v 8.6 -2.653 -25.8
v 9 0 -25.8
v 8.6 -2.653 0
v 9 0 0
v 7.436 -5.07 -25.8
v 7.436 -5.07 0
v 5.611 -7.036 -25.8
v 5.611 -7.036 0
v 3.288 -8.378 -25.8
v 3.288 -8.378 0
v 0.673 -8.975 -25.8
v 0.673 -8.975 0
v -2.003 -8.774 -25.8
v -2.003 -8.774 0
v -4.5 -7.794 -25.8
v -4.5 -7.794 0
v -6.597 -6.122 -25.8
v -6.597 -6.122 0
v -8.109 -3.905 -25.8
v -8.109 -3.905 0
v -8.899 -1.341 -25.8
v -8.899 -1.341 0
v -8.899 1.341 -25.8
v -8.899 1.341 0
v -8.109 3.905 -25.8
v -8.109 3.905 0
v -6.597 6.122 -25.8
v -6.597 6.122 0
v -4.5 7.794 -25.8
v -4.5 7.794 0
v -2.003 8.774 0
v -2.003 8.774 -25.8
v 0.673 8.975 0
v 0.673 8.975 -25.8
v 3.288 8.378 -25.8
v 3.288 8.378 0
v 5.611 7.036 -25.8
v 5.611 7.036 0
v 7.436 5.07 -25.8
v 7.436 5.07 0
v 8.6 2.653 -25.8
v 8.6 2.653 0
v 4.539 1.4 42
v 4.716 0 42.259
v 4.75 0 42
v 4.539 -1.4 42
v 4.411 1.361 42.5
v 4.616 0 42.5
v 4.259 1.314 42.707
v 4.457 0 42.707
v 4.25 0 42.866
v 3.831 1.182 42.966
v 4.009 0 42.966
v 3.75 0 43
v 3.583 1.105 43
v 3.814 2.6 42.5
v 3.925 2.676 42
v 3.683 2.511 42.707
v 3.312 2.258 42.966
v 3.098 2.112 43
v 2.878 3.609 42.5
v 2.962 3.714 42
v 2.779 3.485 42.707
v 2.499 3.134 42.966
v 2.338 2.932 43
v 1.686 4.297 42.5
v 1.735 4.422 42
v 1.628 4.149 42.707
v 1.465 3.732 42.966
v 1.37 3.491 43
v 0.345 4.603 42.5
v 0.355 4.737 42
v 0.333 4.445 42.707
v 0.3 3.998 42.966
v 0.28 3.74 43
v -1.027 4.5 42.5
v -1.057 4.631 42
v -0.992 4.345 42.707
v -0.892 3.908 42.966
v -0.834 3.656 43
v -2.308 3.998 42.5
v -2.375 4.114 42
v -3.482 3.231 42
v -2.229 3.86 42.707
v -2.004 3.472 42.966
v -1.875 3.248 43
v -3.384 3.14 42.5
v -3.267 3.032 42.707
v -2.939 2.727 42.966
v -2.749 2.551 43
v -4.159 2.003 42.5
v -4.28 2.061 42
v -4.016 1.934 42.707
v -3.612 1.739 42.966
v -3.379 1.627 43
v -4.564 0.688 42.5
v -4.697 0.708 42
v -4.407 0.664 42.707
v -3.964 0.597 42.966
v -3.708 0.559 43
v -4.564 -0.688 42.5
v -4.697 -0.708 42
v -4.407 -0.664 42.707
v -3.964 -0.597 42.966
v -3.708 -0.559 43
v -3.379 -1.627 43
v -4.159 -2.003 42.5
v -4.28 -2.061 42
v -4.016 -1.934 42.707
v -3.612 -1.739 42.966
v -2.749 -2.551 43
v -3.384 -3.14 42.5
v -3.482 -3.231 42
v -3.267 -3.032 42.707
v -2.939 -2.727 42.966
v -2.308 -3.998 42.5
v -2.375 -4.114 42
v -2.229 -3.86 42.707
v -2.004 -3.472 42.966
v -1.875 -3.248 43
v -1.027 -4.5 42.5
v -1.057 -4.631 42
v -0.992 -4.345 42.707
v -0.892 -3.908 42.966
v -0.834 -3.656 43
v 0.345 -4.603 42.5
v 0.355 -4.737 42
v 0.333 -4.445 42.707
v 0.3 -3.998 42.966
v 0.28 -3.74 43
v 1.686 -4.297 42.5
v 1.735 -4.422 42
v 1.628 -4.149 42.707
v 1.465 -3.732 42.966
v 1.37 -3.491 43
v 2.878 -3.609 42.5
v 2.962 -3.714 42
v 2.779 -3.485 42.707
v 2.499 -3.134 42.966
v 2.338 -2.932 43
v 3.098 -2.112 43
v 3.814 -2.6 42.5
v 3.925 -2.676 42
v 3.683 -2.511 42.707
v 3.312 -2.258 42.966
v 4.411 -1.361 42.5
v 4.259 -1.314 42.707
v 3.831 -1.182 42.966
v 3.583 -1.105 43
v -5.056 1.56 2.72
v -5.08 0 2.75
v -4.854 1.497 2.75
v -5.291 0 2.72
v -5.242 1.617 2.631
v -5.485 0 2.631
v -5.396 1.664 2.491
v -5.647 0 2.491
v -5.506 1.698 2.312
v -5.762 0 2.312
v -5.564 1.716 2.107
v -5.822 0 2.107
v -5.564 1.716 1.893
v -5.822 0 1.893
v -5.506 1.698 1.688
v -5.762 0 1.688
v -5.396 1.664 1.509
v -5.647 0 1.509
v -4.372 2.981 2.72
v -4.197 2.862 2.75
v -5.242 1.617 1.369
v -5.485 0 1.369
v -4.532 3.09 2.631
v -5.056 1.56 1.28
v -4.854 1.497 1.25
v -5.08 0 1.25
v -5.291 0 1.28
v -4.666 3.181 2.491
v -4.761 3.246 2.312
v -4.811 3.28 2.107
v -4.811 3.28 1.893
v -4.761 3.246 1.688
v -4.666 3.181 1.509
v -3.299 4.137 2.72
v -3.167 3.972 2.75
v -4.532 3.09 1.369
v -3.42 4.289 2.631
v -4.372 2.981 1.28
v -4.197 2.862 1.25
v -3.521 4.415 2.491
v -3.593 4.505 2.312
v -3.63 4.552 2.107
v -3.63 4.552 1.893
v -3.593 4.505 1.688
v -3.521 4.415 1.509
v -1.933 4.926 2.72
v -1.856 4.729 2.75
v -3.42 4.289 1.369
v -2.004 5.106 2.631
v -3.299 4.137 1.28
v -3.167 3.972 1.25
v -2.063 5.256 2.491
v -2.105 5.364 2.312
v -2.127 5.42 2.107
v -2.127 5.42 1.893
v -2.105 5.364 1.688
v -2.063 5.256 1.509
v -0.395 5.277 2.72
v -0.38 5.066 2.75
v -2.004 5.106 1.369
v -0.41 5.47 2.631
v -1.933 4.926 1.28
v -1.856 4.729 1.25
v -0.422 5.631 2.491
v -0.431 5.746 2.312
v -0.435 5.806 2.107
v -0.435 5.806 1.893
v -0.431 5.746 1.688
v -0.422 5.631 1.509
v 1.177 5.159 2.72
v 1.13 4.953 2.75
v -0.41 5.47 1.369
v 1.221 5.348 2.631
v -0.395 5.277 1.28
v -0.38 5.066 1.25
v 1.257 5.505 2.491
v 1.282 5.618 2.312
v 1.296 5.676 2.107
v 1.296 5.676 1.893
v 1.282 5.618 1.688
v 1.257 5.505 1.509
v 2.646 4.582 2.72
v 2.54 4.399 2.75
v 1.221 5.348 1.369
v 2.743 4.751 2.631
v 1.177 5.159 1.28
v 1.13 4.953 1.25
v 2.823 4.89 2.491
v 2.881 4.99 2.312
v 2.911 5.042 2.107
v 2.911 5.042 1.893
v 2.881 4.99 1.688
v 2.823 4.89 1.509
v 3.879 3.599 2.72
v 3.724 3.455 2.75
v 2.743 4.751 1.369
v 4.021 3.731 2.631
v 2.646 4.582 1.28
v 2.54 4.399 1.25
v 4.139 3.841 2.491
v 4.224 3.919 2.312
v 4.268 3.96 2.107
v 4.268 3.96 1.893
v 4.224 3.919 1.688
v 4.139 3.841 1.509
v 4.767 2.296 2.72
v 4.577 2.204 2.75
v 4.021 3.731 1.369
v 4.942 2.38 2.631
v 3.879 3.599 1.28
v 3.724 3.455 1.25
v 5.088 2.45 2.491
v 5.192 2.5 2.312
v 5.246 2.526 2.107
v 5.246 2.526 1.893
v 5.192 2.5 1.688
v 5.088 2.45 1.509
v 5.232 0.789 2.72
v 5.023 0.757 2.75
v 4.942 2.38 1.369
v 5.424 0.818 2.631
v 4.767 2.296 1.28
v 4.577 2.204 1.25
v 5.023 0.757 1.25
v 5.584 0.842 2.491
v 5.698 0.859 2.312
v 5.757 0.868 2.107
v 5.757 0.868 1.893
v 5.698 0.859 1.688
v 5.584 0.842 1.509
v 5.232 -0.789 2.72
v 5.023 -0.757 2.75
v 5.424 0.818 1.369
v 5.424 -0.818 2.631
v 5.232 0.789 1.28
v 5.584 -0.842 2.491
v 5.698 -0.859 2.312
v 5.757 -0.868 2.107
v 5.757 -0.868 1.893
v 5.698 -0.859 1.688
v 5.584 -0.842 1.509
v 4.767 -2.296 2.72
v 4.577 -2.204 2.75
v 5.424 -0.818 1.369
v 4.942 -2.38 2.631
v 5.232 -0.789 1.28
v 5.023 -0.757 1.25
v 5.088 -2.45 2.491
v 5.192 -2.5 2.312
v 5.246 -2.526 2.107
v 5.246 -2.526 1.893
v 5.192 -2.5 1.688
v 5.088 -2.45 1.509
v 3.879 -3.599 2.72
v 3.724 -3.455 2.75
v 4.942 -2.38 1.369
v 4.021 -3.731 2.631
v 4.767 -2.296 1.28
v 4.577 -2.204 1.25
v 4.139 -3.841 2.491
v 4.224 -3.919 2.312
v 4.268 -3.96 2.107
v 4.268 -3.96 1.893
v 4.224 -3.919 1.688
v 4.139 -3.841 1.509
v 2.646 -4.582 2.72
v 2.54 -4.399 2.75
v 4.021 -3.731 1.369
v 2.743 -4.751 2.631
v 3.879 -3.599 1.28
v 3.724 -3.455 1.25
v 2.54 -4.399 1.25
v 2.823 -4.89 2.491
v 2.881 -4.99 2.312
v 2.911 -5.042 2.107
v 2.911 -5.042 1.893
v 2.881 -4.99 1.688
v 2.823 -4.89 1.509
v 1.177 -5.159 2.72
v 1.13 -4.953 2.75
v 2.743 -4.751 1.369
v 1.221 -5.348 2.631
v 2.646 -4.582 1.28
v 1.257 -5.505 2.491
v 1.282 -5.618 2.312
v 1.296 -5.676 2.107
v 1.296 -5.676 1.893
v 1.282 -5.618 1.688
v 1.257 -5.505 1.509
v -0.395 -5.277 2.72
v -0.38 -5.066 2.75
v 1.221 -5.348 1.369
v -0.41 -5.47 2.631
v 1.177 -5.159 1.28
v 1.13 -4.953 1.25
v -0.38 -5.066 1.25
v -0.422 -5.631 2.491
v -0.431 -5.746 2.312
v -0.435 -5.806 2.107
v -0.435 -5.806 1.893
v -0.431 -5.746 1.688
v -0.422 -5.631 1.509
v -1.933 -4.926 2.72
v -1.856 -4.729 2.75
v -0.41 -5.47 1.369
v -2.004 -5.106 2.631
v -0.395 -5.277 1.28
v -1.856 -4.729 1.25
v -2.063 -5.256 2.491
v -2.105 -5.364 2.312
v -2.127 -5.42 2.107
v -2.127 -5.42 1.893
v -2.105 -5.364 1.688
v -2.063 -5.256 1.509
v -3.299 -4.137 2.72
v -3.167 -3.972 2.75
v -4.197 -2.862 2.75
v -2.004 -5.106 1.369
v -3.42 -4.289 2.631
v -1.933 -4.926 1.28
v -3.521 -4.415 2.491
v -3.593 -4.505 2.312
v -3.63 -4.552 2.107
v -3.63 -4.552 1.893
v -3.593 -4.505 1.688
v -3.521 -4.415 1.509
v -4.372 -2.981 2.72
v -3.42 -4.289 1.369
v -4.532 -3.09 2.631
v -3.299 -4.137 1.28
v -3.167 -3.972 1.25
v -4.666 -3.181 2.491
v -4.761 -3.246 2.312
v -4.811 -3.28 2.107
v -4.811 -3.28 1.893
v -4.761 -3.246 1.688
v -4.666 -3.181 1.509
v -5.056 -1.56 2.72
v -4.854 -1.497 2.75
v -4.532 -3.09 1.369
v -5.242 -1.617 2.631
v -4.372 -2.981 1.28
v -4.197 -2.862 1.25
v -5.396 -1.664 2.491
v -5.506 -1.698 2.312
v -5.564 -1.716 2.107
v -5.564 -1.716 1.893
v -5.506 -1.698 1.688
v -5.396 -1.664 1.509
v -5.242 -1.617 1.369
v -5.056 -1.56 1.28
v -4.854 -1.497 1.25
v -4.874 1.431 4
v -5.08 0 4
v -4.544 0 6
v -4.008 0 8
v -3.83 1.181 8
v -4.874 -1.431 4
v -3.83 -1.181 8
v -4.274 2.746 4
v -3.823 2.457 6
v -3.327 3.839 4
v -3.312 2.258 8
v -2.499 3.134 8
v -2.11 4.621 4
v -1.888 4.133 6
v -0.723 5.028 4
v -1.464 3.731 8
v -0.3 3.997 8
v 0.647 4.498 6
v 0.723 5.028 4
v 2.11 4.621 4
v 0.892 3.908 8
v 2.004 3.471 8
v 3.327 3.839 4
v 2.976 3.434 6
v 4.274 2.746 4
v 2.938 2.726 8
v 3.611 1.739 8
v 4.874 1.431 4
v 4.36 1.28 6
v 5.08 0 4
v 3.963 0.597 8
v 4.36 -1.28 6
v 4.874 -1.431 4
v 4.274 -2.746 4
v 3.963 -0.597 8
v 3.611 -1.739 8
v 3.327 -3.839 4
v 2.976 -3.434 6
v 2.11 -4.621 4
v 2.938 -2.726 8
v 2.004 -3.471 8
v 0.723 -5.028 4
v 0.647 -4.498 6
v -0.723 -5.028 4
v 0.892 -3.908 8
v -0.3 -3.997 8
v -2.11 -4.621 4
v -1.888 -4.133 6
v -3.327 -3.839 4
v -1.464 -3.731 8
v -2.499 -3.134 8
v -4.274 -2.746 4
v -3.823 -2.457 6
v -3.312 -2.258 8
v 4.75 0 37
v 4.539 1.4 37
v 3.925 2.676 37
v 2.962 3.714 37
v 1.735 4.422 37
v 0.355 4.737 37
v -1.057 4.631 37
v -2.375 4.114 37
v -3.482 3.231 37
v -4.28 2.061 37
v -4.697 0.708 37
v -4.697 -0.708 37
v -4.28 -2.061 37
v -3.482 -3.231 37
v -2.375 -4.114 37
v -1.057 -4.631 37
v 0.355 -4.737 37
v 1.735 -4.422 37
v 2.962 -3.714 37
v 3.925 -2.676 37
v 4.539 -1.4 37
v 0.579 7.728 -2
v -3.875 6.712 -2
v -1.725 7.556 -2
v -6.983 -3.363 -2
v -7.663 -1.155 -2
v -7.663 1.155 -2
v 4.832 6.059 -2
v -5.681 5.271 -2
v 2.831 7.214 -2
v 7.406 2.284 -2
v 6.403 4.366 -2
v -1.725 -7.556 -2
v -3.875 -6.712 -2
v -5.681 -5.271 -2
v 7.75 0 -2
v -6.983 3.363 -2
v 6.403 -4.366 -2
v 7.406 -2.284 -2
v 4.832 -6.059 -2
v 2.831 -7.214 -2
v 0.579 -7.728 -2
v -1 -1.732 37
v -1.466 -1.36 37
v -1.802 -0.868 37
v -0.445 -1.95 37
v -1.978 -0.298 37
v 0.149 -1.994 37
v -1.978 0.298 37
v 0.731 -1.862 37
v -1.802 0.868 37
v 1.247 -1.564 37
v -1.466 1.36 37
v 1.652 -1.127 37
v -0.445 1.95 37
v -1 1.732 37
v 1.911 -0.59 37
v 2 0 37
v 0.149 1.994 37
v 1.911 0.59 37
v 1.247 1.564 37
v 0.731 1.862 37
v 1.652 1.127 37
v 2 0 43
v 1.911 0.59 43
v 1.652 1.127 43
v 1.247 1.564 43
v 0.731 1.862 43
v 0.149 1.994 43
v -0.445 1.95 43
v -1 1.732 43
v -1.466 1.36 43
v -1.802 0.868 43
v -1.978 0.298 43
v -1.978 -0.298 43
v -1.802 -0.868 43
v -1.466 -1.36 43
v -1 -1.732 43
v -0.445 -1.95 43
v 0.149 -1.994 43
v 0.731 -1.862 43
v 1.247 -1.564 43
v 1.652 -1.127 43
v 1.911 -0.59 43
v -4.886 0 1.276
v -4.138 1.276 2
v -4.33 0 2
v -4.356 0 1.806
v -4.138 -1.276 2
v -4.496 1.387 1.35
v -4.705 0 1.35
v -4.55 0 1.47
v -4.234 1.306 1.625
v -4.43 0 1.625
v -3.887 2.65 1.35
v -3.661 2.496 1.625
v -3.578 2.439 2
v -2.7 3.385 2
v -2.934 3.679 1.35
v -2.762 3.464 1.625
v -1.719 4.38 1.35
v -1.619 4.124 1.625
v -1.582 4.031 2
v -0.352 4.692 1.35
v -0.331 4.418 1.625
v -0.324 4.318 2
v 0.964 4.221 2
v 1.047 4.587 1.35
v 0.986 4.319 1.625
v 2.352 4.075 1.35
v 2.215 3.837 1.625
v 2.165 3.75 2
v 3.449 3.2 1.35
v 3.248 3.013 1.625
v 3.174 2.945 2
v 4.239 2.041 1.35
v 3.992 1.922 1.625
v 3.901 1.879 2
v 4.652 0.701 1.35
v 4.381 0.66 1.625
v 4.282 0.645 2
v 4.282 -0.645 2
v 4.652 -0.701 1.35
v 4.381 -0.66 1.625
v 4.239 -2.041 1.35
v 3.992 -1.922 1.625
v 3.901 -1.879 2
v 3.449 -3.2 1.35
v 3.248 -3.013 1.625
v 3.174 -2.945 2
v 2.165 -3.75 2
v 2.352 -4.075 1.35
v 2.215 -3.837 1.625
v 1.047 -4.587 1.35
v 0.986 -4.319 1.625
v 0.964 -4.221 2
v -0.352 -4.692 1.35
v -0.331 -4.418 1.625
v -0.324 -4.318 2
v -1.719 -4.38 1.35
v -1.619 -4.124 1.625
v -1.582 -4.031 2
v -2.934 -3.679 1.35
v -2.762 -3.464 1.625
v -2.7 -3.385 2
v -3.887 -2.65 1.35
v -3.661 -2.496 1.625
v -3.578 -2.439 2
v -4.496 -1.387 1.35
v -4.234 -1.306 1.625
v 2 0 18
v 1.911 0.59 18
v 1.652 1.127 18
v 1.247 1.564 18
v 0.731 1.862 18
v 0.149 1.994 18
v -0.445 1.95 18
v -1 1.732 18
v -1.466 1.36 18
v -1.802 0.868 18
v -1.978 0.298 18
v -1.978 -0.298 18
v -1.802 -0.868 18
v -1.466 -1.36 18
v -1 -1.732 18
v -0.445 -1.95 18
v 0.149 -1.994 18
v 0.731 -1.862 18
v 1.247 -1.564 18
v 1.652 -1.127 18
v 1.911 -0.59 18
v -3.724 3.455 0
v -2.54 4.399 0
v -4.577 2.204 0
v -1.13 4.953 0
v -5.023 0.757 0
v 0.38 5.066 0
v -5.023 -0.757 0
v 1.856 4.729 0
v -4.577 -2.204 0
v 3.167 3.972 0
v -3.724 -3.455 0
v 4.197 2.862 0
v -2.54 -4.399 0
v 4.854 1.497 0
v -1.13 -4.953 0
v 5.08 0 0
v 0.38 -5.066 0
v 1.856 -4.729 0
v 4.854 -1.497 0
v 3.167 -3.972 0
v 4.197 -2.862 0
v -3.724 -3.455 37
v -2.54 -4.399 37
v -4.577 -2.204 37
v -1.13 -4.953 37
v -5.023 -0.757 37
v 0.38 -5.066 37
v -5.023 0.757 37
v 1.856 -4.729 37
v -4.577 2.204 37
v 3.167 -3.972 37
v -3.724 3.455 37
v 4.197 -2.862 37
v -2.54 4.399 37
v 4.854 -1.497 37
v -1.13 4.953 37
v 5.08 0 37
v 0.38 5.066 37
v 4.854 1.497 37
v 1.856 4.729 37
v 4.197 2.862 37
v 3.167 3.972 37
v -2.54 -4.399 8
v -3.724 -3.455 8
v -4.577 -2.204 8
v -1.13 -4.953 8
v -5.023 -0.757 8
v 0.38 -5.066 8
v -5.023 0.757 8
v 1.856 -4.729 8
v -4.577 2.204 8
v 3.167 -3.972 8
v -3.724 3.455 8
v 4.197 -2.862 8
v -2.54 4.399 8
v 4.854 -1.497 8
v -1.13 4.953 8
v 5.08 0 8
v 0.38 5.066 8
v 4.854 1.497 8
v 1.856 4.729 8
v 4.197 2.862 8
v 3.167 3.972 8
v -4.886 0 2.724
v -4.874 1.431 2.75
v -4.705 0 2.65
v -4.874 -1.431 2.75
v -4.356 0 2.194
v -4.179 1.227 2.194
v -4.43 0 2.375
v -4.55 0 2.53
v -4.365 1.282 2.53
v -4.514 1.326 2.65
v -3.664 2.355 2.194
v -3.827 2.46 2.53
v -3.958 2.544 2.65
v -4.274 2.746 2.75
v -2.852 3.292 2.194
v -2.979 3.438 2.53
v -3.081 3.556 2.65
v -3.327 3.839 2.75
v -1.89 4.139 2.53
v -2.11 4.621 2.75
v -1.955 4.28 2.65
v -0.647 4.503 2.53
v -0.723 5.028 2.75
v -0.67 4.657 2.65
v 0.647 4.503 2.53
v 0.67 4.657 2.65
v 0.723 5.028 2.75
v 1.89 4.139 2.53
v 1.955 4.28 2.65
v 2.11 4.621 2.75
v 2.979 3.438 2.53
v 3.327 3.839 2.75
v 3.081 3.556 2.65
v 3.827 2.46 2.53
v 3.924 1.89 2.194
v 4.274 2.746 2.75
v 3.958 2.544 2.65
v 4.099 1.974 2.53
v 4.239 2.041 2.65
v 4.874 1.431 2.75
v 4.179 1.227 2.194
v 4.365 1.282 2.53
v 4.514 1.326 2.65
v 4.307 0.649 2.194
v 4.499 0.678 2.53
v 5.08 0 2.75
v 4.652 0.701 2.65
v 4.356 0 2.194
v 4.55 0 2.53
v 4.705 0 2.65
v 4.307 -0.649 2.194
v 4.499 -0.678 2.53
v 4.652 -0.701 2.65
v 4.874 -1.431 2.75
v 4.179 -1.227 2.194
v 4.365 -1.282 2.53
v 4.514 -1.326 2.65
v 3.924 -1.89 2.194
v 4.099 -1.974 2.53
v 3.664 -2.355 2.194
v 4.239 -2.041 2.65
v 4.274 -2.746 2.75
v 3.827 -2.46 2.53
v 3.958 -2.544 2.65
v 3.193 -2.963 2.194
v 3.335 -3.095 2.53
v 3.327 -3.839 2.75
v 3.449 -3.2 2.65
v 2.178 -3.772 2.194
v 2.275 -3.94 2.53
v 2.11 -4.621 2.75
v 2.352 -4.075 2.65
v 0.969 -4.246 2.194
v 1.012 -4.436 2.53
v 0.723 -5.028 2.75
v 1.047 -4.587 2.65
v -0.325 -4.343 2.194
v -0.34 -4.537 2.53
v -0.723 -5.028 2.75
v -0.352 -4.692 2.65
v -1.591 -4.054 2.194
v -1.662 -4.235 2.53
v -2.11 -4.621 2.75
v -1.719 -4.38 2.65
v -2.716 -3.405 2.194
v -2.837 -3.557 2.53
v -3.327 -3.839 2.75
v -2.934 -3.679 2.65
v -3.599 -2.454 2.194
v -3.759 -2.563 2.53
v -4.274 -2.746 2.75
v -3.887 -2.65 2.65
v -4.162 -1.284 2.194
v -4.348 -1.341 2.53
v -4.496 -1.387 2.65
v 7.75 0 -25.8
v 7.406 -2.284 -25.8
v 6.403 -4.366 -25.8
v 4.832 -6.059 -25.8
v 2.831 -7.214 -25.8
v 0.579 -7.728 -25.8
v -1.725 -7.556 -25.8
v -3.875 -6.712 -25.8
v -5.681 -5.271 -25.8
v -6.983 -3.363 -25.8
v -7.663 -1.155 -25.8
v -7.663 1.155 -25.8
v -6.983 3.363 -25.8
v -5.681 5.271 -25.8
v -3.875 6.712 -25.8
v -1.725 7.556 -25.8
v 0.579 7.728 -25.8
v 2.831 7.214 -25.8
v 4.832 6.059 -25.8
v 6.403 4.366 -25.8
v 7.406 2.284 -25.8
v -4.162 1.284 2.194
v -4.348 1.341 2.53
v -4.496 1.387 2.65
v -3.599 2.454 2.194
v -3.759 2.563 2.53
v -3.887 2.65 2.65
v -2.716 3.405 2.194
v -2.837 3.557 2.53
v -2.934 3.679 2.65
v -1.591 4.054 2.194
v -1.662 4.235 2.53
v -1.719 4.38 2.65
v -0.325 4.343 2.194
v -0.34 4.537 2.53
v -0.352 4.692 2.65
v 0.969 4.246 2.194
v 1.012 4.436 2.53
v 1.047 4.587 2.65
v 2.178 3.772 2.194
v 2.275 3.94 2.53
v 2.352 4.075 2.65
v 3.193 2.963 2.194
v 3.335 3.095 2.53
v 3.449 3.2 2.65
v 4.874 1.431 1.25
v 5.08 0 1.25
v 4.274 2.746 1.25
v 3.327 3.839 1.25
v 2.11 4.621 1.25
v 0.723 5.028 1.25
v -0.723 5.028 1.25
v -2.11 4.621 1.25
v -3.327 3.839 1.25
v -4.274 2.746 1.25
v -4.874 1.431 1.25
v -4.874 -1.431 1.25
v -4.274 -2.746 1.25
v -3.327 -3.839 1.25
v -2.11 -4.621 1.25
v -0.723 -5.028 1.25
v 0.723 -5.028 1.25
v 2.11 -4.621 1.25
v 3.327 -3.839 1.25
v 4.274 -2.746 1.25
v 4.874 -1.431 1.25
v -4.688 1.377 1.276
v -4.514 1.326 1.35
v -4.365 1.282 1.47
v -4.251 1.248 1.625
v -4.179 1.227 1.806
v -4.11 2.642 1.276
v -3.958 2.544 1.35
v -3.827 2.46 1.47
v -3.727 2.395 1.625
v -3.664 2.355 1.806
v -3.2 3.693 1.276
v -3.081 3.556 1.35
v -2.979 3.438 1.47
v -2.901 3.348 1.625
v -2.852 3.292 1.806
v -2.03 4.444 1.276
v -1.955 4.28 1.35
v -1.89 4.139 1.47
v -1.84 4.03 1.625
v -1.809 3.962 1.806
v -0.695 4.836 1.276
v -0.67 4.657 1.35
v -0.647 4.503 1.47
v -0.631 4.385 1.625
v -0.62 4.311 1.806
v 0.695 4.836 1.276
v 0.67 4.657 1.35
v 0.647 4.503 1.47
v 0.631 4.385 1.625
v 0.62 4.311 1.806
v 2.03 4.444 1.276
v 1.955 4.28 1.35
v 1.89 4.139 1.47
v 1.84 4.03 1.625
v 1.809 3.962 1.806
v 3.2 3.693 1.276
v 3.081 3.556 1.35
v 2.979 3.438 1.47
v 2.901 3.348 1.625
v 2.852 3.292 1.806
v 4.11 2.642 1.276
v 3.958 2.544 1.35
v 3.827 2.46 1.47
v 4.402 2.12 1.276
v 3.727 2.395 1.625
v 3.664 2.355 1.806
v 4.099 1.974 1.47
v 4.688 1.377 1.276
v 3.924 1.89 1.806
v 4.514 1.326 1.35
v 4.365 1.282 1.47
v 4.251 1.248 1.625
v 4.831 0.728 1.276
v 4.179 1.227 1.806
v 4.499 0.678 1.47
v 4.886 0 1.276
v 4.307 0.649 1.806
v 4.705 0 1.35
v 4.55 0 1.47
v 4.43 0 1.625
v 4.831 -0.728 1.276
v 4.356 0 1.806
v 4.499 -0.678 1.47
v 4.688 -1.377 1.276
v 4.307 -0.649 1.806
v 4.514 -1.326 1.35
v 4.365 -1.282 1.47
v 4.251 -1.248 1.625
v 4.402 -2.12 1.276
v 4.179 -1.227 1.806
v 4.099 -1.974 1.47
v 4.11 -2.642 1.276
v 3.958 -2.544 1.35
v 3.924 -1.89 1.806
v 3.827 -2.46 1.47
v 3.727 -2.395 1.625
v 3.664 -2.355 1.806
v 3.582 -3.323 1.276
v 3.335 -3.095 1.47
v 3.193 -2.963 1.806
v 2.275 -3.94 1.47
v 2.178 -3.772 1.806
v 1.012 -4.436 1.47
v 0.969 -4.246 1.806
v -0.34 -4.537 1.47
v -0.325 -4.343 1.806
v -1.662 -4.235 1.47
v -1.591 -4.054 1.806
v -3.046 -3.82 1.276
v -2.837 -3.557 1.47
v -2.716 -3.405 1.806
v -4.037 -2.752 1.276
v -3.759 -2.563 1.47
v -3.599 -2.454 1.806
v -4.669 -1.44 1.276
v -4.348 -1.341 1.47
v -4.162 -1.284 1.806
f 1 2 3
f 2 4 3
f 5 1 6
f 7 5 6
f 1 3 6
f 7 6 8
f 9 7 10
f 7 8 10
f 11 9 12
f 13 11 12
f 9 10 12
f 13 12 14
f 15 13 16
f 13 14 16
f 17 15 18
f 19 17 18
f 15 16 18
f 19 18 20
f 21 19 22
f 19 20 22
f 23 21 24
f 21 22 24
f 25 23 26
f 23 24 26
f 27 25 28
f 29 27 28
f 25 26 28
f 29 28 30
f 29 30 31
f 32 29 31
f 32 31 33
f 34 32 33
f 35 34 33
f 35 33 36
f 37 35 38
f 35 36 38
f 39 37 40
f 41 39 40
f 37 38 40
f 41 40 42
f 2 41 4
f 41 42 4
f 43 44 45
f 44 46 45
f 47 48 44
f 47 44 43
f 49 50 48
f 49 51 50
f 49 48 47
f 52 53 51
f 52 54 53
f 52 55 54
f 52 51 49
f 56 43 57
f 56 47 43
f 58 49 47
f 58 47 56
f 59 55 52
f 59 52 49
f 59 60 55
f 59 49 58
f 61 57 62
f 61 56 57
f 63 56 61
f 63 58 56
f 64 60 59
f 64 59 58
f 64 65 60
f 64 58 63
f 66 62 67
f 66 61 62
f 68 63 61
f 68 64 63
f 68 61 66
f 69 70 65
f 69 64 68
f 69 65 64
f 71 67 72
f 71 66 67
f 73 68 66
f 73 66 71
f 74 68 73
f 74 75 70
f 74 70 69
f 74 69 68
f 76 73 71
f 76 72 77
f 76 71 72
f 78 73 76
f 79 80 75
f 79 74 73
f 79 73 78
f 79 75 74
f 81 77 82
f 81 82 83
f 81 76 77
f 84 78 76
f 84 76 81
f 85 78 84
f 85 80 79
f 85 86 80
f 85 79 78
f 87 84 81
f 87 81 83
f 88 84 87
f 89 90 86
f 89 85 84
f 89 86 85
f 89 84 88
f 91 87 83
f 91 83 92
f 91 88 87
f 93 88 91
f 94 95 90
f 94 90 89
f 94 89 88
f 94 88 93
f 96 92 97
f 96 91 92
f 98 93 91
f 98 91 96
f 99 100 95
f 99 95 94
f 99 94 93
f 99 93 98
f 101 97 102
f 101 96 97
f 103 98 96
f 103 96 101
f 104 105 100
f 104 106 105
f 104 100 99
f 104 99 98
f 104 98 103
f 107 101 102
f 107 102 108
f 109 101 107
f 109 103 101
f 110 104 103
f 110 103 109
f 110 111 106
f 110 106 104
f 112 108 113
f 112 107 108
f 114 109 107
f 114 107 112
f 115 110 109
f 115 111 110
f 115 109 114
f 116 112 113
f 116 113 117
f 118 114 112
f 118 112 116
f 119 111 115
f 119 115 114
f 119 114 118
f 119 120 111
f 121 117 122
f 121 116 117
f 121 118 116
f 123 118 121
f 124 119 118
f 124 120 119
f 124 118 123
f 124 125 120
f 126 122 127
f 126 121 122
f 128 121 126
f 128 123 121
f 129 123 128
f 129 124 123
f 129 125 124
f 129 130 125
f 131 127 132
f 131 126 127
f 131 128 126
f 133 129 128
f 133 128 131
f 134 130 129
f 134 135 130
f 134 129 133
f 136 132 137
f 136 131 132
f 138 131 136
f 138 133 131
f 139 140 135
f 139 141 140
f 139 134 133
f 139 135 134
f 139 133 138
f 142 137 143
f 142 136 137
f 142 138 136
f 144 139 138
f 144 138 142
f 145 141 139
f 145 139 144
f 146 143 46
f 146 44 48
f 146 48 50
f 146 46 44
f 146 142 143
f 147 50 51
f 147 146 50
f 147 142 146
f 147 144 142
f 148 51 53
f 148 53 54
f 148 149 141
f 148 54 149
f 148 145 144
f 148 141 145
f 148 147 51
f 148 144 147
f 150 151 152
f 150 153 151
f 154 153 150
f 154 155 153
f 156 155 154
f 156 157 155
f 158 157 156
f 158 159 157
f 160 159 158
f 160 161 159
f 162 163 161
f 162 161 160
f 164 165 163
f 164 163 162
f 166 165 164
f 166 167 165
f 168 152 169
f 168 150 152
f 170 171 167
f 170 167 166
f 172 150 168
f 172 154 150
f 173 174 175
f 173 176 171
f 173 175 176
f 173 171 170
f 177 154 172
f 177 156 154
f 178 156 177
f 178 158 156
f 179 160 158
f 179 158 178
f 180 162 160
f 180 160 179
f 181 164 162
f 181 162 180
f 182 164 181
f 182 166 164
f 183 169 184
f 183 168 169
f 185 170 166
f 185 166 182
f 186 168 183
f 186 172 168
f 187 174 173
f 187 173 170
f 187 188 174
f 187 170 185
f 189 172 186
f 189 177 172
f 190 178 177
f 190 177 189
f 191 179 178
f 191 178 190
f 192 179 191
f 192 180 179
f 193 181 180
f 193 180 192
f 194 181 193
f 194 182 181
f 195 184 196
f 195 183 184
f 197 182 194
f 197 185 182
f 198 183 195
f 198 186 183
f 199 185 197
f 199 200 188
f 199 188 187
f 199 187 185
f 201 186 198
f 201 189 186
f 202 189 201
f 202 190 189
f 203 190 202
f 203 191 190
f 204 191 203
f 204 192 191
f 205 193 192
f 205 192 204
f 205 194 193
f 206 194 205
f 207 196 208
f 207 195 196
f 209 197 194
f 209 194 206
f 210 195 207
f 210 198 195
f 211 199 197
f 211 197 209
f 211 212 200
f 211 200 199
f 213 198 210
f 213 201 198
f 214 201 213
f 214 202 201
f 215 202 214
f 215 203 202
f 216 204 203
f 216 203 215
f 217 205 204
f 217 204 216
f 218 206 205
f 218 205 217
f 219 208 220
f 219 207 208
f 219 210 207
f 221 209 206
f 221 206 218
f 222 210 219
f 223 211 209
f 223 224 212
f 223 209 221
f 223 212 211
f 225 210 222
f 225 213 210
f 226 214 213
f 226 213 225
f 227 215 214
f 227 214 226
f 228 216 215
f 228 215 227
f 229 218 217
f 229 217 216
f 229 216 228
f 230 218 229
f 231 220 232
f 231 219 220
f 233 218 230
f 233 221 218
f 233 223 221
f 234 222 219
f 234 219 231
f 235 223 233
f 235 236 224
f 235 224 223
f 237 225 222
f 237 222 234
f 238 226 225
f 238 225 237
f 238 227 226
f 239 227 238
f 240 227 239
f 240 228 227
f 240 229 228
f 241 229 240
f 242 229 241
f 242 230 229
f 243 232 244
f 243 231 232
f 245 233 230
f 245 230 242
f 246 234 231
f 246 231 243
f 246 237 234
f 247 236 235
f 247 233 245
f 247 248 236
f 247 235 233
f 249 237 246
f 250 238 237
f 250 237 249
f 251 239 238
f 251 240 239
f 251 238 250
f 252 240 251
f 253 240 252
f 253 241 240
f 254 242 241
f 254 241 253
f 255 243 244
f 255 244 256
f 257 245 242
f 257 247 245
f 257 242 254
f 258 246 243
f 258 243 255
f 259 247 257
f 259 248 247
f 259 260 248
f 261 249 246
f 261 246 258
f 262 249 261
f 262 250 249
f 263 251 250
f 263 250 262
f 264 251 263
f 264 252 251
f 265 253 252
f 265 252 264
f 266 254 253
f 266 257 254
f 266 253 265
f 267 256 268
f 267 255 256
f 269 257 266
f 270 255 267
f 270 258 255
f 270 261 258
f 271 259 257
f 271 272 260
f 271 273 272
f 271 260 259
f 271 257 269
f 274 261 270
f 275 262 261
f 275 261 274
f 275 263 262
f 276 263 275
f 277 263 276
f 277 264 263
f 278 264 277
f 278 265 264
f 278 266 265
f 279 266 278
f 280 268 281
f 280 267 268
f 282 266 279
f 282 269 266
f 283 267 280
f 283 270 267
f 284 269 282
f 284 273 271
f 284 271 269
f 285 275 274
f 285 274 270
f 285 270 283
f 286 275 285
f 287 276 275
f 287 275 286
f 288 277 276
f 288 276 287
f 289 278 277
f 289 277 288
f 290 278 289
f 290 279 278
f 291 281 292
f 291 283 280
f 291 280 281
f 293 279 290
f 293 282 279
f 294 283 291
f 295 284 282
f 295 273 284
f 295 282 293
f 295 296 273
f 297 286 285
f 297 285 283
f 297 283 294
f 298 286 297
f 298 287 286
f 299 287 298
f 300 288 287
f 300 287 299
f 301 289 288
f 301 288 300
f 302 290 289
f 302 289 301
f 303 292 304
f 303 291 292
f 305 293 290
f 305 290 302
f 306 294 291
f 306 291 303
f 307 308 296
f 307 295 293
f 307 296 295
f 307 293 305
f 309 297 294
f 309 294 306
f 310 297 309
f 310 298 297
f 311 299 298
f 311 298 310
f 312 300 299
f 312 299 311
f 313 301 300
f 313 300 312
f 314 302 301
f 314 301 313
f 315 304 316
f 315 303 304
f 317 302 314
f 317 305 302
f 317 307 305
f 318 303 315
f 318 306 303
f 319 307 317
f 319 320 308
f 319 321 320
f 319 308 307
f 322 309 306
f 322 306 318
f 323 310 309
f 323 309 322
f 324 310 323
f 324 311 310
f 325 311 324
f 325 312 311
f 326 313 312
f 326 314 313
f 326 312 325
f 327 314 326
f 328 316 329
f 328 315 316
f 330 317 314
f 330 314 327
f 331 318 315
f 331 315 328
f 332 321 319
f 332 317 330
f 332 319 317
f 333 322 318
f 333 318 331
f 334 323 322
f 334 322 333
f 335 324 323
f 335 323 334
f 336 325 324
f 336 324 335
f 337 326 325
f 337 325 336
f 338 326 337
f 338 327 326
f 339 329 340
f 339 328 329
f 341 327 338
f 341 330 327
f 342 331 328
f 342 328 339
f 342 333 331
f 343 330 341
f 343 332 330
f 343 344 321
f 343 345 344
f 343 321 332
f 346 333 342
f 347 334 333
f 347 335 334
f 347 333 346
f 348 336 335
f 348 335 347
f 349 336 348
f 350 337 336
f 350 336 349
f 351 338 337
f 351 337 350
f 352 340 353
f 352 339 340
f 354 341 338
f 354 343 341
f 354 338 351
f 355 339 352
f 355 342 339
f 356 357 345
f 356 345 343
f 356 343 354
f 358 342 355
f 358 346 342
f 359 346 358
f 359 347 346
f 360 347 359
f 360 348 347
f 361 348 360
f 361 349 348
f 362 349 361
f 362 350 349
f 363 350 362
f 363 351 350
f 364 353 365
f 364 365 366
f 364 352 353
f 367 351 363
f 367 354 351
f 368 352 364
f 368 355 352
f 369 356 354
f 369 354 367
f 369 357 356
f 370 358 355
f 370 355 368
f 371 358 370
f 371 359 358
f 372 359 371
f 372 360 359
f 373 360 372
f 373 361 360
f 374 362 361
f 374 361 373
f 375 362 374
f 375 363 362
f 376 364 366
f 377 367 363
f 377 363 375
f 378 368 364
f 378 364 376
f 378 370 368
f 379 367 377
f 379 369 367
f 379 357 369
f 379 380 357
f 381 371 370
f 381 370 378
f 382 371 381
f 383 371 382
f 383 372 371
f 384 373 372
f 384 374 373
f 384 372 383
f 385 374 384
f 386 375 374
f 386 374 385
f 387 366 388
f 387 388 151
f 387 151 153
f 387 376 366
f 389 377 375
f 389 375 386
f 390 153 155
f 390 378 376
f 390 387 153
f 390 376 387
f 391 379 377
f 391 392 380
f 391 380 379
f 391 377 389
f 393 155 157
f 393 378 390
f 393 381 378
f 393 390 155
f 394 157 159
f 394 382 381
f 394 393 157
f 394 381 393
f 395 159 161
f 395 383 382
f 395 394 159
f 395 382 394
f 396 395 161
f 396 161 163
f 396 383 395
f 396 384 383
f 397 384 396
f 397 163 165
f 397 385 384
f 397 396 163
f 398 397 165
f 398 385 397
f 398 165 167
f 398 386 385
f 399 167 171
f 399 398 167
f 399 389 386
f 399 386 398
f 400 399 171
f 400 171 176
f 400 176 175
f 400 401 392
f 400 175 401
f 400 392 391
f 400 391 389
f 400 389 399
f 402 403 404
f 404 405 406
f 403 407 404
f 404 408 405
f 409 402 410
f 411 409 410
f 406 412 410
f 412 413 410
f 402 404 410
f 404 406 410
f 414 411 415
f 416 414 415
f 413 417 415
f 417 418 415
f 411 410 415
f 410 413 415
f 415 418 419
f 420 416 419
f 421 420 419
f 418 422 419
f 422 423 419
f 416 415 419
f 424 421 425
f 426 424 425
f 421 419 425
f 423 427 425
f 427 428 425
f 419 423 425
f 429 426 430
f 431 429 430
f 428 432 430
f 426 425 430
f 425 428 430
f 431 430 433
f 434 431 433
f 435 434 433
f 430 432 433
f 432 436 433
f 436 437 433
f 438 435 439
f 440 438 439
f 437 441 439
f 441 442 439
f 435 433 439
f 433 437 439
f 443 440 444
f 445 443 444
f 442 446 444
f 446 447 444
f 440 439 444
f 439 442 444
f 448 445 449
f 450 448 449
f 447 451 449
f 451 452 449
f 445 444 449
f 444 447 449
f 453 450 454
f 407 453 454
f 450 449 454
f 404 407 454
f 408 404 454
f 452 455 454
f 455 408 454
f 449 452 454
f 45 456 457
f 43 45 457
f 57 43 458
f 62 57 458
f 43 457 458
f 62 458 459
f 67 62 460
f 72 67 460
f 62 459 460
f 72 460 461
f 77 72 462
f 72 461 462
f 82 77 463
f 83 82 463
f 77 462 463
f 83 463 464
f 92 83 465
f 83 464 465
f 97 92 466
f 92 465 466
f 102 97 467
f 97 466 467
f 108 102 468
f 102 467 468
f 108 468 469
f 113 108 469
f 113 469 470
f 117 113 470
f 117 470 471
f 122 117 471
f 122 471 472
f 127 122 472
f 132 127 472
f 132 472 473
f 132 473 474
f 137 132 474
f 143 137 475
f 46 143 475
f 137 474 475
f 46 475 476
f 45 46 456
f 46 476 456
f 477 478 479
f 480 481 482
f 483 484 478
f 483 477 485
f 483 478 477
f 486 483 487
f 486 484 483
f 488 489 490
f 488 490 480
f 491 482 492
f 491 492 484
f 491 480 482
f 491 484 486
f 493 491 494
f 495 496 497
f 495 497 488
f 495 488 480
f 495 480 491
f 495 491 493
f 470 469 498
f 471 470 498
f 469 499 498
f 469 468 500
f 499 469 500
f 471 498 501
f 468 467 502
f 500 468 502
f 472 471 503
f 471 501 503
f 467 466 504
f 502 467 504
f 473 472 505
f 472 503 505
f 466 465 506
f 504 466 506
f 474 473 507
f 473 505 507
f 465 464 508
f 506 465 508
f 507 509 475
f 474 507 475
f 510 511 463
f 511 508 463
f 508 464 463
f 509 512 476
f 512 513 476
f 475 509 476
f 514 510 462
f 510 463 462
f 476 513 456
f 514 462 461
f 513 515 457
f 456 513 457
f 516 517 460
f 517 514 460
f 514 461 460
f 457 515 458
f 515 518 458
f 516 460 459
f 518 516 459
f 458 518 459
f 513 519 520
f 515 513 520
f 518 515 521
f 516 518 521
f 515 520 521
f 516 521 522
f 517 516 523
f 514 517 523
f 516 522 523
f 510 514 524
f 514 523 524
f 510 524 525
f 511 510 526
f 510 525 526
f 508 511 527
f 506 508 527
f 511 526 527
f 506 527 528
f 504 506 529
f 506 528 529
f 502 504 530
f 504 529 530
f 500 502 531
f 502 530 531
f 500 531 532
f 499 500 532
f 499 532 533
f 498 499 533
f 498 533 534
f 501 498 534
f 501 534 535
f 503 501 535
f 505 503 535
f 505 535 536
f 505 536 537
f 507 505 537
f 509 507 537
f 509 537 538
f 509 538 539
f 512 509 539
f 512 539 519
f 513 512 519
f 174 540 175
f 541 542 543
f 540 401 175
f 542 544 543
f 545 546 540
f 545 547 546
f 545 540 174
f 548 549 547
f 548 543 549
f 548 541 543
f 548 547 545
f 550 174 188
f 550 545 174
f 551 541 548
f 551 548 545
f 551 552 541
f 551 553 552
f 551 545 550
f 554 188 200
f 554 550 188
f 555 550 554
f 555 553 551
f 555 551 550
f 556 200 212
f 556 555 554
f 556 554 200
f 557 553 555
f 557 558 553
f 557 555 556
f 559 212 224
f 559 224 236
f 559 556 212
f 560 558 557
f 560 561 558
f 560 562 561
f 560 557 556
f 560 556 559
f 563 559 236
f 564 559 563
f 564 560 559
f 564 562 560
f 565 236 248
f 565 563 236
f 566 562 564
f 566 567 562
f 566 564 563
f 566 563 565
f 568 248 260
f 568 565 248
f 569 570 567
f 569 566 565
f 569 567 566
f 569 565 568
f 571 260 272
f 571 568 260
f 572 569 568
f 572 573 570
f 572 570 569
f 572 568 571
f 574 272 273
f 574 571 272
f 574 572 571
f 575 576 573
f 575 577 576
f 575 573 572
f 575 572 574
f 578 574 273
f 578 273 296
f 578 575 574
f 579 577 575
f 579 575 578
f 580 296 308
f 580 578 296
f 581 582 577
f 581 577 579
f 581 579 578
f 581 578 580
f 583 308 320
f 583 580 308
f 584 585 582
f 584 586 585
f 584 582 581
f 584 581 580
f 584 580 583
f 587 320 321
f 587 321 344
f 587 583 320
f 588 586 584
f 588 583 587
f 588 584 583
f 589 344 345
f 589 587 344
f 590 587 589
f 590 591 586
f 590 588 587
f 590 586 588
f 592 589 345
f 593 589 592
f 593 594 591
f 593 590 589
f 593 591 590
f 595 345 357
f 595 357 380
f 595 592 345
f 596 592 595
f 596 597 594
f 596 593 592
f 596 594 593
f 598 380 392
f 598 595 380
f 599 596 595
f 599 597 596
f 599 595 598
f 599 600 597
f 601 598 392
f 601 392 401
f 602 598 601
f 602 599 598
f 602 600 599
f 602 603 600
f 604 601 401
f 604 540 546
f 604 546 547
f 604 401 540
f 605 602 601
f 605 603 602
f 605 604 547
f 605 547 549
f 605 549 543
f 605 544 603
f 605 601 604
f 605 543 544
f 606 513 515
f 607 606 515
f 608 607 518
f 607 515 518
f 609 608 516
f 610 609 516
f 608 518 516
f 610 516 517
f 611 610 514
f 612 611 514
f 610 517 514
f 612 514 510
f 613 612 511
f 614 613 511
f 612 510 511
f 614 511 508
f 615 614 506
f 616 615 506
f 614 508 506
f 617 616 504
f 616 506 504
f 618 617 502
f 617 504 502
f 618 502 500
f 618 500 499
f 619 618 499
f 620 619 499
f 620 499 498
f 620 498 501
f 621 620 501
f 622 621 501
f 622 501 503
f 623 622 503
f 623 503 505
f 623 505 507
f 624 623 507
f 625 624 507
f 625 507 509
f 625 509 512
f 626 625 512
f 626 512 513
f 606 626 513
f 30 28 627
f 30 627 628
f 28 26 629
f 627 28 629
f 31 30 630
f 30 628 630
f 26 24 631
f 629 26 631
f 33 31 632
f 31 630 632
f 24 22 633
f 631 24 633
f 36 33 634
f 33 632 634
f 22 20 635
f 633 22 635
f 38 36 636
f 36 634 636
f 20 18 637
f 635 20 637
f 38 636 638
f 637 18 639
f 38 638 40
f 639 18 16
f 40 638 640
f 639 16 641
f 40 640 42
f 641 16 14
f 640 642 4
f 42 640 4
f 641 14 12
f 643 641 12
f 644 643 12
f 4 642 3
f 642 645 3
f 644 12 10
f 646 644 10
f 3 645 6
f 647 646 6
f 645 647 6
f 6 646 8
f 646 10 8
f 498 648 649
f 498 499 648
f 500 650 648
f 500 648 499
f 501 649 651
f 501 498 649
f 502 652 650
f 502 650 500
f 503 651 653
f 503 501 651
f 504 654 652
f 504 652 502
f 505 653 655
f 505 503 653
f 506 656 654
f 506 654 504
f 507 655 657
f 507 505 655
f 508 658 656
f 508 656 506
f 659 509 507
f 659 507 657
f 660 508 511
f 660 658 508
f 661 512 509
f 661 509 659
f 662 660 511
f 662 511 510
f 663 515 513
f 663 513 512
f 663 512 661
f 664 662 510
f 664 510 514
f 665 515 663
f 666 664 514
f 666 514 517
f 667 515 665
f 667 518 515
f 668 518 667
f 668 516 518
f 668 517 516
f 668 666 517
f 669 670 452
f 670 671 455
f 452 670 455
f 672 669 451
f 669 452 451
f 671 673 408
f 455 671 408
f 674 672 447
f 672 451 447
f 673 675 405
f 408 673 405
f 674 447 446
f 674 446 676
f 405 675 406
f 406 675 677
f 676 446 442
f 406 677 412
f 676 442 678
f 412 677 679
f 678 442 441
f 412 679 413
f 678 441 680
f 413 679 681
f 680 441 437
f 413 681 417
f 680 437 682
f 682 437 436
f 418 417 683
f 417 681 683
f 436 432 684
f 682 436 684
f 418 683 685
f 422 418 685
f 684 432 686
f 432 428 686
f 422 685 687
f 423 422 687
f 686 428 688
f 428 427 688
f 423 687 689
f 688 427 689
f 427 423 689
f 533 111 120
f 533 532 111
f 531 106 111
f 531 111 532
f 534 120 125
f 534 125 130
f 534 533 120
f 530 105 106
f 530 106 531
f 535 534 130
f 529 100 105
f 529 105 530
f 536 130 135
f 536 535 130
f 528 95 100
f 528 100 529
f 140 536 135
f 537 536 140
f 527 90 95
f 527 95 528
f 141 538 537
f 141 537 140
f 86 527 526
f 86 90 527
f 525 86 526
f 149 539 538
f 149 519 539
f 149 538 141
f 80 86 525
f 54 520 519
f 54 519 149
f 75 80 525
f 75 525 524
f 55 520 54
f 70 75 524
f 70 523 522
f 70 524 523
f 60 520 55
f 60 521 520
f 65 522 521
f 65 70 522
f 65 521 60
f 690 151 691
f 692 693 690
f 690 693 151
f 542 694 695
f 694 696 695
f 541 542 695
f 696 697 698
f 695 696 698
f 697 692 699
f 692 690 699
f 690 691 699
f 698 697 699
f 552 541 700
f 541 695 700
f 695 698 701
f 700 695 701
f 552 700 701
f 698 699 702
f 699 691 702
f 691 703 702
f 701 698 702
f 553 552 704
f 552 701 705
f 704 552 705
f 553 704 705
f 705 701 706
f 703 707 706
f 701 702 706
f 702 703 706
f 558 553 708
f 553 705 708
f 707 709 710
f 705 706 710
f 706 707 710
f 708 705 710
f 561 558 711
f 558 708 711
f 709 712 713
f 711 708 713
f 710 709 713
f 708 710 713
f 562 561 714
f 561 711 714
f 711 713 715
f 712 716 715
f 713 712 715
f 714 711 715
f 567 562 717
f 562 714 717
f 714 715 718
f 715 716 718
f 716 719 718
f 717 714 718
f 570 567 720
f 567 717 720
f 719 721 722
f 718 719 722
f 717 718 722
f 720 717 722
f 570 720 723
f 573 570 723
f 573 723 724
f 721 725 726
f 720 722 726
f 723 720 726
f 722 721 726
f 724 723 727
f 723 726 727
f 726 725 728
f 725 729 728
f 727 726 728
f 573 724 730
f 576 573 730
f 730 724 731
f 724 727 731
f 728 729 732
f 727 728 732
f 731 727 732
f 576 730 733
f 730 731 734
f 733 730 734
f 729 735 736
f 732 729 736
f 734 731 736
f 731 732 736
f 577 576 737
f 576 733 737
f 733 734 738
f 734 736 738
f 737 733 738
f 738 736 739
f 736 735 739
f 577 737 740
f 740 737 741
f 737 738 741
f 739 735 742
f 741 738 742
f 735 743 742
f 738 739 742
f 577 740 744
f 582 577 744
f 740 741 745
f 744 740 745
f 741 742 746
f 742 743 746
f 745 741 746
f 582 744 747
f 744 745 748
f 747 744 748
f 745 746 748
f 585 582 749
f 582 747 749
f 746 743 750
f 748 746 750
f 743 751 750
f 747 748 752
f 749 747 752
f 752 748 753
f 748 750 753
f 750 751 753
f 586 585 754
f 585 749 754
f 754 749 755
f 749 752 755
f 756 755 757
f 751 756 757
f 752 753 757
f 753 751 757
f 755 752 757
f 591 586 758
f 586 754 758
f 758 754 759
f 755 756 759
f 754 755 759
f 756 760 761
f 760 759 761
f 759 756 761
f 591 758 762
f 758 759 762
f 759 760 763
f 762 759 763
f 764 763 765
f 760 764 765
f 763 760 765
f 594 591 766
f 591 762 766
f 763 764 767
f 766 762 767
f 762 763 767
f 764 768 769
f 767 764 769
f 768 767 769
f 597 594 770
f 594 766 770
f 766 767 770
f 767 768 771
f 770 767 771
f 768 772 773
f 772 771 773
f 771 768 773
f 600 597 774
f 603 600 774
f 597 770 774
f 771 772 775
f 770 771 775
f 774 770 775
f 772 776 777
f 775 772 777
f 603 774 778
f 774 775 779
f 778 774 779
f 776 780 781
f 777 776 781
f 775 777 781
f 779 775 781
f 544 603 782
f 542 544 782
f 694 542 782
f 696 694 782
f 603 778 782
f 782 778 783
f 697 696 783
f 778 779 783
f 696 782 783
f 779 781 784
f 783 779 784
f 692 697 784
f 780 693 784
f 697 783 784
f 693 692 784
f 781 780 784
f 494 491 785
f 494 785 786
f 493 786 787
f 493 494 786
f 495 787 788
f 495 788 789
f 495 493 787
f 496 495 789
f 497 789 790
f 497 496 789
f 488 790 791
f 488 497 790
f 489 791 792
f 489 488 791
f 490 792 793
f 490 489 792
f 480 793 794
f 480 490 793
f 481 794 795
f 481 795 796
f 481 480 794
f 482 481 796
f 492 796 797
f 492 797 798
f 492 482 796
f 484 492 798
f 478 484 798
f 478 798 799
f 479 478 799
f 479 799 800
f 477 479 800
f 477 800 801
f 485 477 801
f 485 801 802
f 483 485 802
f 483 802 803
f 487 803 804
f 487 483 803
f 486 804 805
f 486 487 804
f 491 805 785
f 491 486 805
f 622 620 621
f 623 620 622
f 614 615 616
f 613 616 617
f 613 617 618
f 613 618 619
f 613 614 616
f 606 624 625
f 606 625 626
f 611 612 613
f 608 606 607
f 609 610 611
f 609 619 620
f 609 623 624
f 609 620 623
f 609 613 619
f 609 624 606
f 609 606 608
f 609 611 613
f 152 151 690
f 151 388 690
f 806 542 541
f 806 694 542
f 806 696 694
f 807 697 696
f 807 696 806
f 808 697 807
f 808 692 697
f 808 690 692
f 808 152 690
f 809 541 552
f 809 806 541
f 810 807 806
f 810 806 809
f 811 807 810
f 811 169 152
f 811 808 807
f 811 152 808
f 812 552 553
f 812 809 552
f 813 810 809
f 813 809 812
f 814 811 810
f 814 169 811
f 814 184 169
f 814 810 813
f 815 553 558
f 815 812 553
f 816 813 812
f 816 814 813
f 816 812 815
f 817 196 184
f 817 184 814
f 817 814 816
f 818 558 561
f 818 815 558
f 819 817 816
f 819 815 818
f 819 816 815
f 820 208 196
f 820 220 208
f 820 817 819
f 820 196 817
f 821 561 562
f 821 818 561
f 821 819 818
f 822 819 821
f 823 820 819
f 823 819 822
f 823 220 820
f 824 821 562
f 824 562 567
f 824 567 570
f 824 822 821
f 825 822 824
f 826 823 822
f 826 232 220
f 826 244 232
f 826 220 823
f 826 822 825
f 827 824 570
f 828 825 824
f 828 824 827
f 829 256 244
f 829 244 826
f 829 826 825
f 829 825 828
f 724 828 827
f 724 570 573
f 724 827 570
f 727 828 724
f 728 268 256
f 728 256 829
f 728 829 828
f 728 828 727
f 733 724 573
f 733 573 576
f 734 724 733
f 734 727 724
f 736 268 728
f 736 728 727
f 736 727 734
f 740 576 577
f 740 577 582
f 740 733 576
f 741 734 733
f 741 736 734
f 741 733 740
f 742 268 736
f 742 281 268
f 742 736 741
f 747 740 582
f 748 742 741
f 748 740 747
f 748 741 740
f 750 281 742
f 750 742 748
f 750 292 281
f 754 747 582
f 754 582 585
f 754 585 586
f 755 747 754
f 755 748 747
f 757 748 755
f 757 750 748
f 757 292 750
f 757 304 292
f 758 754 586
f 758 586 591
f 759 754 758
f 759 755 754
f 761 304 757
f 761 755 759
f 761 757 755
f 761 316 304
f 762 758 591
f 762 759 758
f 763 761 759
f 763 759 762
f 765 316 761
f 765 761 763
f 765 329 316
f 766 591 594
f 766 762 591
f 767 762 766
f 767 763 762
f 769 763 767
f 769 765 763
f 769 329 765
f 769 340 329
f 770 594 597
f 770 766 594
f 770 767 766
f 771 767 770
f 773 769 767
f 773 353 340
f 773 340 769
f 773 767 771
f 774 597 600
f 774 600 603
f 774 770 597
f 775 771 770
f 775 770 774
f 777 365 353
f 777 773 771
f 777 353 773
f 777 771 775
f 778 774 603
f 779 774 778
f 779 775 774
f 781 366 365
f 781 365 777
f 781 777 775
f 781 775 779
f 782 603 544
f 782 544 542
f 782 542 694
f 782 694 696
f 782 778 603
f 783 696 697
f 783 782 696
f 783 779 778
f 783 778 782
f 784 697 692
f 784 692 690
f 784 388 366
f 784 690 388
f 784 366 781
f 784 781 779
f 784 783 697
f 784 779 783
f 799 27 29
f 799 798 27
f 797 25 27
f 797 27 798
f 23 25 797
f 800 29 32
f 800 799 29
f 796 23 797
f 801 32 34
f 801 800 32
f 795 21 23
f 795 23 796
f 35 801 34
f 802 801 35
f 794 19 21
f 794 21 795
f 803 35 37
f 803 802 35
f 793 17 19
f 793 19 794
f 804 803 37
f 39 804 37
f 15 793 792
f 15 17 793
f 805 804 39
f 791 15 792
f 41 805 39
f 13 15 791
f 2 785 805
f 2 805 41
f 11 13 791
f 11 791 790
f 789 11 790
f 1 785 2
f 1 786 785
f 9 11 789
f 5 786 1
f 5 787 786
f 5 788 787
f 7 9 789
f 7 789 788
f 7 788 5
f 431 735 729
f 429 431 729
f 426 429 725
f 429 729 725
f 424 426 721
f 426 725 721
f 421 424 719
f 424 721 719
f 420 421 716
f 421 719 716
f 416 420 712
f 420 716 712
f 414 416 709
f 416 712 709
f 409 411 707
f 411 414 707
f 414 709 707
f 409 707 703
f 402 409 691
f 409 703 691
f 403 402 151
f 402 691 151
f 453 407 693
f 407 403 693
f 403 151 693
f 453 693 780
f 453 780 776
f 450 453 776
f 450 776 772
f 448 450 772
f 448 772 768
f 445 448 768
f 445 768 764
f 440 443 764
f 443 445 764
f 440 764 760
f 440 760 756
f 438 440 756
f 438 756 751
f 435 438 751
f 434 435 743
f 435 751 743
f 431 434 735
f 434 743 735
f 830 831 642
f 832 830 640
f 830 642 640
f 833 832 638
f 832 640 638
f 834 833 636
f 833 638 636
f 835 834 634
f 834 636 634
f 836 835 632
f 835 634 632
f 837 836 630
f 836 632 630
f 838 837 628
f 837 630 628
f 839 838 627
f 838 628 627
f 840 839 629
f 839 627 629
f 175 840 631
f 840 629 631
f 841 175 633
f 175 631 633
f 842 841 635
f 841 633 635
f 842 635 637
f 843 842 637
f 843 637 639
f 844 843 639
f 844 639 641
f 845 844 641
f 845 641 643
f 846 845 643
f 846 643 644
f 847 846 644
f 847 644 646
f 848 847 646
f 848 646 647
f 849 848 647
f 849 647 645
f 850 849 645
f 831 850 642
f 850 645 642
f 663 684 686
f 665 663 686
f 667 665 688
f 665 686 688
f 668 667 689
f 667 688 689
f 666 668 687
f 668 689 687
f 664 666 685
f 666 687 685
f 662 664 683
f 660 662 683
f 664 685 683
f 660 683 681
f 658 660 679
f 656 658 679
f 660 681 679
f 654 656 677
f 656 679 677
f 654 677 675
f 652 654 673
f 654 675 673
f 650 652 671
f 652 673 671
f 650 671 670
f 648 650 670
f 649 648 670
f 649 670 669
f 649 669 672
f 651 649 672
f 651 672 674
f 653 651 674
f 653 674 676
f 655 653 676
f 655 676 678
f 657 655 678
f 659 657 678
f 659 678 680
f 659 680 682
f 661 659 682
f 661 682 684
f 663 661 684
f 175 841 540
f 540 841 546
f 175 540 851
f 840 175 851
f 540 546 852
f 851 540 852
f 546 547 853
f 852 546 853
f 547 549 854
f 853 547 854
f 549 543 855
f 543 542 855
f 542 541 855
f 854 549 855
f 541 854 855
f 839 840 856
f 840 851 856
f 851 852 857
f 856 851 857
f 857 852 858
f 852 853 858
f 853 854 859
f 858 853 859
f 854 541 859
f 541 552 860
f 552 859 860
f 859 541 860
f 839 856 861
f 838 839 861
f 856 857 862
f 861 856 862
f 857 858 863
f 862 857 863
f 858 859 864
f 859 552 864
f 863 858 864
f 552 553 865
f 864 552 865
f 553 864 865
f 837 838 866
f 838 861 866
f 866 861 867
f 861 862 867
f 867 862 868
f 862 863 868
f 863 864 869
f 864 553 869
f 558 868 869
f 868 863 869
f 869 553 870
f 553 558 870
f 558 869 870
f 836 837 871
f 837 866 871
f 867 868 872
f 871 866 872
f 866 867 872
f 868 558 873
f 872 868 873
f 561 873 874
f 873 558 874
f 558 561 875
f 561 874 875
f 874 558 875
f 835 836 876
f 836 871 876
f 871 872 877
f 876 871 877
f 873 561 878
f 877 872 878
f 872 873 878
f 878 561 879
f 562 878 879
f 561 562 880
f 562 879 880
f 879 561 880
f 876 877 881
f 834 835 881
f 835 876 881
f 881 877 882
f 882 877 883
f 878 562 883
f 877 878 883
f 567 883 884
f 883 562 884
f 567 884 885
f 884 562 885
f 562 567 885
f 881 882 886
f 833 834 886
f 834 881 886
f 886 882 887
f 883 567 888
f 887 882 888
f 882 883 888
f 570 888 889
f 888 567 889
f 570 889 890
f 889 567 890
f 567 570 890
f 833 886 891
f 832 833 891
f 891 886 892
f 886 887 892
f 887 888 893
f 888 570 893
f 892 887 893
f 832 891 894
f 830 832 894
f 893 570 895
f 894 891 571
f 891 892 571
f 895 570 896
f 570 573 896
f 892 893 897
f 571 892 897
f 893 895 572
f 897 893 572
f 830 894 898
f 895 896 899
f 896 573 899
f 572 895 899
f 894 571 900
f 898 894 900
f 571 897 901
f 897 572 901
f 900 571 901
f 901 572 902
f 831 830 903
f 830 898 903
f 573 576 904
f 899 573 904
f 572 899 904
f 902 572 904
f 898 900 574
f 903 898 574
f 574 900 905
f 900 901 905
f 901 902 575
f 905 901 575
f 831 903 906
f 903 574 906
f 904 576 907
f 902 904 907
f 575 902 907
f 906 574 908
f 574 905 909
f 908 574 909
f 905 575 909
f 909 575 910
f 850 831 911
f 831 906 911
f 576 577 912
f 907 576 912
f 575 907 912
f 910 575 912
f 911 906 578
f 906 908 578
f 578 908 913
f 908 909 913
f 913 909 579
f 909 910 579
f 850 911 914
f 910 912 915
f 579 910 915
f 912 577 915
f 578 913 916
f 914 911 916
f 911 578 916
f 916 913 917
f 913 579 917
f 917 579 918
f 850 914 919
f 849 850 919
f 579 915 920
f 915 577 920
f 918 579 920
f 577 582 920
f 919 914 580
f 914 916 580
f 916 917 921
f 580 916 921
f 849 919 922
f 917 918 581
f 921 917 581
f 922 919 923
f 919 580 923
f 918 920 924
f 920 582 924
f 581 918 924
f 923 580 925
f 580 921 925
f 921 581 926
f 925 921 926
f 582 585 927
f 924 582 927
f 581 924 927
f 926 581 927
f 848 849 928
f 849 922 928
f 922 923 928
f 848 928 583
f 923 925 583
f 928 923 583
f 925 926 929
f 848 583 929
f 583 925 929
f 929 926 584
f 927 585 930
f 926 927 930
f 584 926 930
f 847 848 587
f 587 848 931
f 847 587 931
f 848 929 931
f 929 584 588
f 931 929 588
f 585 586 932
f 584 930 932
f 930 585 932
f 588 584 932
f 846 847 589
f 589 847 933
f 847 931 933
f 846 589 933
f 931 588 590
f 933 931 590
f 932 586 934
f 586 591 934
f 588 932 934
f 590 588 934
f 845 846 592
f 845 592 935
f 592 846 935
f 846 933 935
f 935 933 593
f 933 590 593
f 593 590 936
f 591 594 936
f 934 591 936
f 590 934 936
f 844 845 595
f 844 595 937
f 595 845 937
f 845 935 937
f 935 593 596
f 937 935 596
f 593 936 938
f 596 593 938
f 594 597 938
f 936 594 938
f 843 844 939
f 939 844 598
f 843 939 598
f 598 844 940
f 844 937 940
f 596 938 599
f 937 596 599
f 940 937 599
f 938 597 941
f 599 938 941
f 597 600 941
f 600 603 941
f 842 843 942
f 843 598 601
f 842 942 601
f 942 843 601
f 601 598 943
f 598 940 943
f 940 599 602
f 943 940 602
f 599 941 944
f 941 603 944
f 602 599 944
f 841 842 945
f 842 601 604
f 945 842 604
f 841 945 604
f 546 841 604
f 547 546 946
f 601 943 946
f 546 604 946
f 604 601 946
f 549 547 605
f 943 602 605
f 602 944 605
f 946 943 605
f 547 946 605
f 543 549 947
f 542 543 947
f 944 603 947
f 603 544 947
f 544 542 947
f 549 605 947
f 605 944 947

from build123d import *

# Parameters (mm, degrees)
F0_R      = 5.08
F1_DEPTH  = 37
F2_R      = 9
F3_DEPTH  = 2
F4_R      = 9
F4_R_2    = 7.75
F5_DEPTH  = 23.8
F6_R      = 4.75
F7_DEPTH  = 6
F8_R      = 1
F13_R     = 2
F14_DEPTH = 25


with BuildPart() as f1:
    # F0 (on Top) → F1 (new body)
    with BuildSketch(Plane.XY):
        Circle(F0_R)
    extrude(amount=F1_DEPTH)

    # F2 (on face) → F3 (join)
    with BuildSketch(Plane(origin=(0, 0, 0), x_dir=(1, 0, 0), z_dir=(0, 0, -1))):
        Circle(F2_R)
    extrude(amount=F3_DEPTH)

    # F4 (on face) → F5 (join)
    with BuildSketch(Plane(origin=(0, 0, -2), x_dir=(1, 0, 0), z_dir=(0, 0, -1))):
        Circle(F4_R)
        Circle(F4_R_2, mode=Mode.SUBTRACT)
    extrude(amount=F5_DEPTH)

    # F9 (on Front) → F10 (revolve, cut)
    with BuildSketch(Plane.XZ):
        Polygon((-5.08, 8), (-5.08, 4), (-4.0082032303, 8), align=None)
    revolve(axis=Axis((0, 0, 0), (0, 0, -1)), mode=Mode.SUBTRACT)

    # F9 (on Front) → F11 (revolve, cut)
    with BuildSketch(Plane.XZ):
        with BuildLine():
            Line((-5.08, 1.25), (-5.08, 2.75))
            ThreePointArc((-5.08, 2.75), (-5.83, 2), (-5.08, 1.25))
        make_face()
        with BuildLine():
            ThreePointArc((-4.33, 2), (-4.5496699141, 2.5303300859), (-5.08, 2.75))
            Line((-5.08, 2.75), (-5.08, 1.25))
            ThreePointArc((-5.08, 1.25), (-4.5496699141, 1.4696699141), (-4.33, 2))
        make_face()
    revolve(axis=Axis((0, 0, 0), (0, 0, -1)), mode=Mode.SUBTRACT)


with BuildPart() as f7:
    # F6 (on face) → F7 (new body)
    with BuildSketch(Plane.XY.offset(37)):
        Circle(F6_R)
    extrude(amount=F7_DEPTH)

    # F8
    f8_edges = [f7.edges().sort_by_distance(p)[0] for p in [
        (-4.75, 0, 43),
    ]]
    fillet(f8_edges, radius=F8_R)


with BuildPart() as f12:
    # F9 (on Front) → F12 (revolve)
    with BuildSketch(Plane.XZ):
        with BuildLine():
            ThreePointArc((-4.33, 2), (-4.5496699141, 2.5303300859), (-5.08, 2.75))
            Line((-5.08, 2.75), (-5.08, 1.25))
            ThreePointArc((-5.08, 1.25), (-4.5496699141, 1.4696699141), (-4.33, 2))
        make_face()
        with BuildLine():
            Line((-5.08, 1.25), (-5.08, 2.75))
            ThreePointArc((-5.08, 2.75), (-5.83, 2), (-5.08, 1.25))
        make_face()
    revolve(axis=Axis((0, 0, 0), (0, 0, -1)))


with BuildPart() as f14_tool:
    # F13 (on face) → F14 (new body)
    with BuildSketch(Plane.XY.offset(43)):
        Circle(F13_R)
    extrude(amount=-F14_DEPTH)


with BuildPart() as f1_1:
    add(f1.part)

    # F14: cut by f14_tool
    add(f14_tool.part, mode=Mode.SUBTRACT)


with BuildPart() as f7_1:
    add(f7.part)

    # F14: cut by f14_tool
    add(f14_tool.part, mode=Mode.SUBTRACT)


solid = Compound([f12.part, f1_1.part, f7_1.part])
